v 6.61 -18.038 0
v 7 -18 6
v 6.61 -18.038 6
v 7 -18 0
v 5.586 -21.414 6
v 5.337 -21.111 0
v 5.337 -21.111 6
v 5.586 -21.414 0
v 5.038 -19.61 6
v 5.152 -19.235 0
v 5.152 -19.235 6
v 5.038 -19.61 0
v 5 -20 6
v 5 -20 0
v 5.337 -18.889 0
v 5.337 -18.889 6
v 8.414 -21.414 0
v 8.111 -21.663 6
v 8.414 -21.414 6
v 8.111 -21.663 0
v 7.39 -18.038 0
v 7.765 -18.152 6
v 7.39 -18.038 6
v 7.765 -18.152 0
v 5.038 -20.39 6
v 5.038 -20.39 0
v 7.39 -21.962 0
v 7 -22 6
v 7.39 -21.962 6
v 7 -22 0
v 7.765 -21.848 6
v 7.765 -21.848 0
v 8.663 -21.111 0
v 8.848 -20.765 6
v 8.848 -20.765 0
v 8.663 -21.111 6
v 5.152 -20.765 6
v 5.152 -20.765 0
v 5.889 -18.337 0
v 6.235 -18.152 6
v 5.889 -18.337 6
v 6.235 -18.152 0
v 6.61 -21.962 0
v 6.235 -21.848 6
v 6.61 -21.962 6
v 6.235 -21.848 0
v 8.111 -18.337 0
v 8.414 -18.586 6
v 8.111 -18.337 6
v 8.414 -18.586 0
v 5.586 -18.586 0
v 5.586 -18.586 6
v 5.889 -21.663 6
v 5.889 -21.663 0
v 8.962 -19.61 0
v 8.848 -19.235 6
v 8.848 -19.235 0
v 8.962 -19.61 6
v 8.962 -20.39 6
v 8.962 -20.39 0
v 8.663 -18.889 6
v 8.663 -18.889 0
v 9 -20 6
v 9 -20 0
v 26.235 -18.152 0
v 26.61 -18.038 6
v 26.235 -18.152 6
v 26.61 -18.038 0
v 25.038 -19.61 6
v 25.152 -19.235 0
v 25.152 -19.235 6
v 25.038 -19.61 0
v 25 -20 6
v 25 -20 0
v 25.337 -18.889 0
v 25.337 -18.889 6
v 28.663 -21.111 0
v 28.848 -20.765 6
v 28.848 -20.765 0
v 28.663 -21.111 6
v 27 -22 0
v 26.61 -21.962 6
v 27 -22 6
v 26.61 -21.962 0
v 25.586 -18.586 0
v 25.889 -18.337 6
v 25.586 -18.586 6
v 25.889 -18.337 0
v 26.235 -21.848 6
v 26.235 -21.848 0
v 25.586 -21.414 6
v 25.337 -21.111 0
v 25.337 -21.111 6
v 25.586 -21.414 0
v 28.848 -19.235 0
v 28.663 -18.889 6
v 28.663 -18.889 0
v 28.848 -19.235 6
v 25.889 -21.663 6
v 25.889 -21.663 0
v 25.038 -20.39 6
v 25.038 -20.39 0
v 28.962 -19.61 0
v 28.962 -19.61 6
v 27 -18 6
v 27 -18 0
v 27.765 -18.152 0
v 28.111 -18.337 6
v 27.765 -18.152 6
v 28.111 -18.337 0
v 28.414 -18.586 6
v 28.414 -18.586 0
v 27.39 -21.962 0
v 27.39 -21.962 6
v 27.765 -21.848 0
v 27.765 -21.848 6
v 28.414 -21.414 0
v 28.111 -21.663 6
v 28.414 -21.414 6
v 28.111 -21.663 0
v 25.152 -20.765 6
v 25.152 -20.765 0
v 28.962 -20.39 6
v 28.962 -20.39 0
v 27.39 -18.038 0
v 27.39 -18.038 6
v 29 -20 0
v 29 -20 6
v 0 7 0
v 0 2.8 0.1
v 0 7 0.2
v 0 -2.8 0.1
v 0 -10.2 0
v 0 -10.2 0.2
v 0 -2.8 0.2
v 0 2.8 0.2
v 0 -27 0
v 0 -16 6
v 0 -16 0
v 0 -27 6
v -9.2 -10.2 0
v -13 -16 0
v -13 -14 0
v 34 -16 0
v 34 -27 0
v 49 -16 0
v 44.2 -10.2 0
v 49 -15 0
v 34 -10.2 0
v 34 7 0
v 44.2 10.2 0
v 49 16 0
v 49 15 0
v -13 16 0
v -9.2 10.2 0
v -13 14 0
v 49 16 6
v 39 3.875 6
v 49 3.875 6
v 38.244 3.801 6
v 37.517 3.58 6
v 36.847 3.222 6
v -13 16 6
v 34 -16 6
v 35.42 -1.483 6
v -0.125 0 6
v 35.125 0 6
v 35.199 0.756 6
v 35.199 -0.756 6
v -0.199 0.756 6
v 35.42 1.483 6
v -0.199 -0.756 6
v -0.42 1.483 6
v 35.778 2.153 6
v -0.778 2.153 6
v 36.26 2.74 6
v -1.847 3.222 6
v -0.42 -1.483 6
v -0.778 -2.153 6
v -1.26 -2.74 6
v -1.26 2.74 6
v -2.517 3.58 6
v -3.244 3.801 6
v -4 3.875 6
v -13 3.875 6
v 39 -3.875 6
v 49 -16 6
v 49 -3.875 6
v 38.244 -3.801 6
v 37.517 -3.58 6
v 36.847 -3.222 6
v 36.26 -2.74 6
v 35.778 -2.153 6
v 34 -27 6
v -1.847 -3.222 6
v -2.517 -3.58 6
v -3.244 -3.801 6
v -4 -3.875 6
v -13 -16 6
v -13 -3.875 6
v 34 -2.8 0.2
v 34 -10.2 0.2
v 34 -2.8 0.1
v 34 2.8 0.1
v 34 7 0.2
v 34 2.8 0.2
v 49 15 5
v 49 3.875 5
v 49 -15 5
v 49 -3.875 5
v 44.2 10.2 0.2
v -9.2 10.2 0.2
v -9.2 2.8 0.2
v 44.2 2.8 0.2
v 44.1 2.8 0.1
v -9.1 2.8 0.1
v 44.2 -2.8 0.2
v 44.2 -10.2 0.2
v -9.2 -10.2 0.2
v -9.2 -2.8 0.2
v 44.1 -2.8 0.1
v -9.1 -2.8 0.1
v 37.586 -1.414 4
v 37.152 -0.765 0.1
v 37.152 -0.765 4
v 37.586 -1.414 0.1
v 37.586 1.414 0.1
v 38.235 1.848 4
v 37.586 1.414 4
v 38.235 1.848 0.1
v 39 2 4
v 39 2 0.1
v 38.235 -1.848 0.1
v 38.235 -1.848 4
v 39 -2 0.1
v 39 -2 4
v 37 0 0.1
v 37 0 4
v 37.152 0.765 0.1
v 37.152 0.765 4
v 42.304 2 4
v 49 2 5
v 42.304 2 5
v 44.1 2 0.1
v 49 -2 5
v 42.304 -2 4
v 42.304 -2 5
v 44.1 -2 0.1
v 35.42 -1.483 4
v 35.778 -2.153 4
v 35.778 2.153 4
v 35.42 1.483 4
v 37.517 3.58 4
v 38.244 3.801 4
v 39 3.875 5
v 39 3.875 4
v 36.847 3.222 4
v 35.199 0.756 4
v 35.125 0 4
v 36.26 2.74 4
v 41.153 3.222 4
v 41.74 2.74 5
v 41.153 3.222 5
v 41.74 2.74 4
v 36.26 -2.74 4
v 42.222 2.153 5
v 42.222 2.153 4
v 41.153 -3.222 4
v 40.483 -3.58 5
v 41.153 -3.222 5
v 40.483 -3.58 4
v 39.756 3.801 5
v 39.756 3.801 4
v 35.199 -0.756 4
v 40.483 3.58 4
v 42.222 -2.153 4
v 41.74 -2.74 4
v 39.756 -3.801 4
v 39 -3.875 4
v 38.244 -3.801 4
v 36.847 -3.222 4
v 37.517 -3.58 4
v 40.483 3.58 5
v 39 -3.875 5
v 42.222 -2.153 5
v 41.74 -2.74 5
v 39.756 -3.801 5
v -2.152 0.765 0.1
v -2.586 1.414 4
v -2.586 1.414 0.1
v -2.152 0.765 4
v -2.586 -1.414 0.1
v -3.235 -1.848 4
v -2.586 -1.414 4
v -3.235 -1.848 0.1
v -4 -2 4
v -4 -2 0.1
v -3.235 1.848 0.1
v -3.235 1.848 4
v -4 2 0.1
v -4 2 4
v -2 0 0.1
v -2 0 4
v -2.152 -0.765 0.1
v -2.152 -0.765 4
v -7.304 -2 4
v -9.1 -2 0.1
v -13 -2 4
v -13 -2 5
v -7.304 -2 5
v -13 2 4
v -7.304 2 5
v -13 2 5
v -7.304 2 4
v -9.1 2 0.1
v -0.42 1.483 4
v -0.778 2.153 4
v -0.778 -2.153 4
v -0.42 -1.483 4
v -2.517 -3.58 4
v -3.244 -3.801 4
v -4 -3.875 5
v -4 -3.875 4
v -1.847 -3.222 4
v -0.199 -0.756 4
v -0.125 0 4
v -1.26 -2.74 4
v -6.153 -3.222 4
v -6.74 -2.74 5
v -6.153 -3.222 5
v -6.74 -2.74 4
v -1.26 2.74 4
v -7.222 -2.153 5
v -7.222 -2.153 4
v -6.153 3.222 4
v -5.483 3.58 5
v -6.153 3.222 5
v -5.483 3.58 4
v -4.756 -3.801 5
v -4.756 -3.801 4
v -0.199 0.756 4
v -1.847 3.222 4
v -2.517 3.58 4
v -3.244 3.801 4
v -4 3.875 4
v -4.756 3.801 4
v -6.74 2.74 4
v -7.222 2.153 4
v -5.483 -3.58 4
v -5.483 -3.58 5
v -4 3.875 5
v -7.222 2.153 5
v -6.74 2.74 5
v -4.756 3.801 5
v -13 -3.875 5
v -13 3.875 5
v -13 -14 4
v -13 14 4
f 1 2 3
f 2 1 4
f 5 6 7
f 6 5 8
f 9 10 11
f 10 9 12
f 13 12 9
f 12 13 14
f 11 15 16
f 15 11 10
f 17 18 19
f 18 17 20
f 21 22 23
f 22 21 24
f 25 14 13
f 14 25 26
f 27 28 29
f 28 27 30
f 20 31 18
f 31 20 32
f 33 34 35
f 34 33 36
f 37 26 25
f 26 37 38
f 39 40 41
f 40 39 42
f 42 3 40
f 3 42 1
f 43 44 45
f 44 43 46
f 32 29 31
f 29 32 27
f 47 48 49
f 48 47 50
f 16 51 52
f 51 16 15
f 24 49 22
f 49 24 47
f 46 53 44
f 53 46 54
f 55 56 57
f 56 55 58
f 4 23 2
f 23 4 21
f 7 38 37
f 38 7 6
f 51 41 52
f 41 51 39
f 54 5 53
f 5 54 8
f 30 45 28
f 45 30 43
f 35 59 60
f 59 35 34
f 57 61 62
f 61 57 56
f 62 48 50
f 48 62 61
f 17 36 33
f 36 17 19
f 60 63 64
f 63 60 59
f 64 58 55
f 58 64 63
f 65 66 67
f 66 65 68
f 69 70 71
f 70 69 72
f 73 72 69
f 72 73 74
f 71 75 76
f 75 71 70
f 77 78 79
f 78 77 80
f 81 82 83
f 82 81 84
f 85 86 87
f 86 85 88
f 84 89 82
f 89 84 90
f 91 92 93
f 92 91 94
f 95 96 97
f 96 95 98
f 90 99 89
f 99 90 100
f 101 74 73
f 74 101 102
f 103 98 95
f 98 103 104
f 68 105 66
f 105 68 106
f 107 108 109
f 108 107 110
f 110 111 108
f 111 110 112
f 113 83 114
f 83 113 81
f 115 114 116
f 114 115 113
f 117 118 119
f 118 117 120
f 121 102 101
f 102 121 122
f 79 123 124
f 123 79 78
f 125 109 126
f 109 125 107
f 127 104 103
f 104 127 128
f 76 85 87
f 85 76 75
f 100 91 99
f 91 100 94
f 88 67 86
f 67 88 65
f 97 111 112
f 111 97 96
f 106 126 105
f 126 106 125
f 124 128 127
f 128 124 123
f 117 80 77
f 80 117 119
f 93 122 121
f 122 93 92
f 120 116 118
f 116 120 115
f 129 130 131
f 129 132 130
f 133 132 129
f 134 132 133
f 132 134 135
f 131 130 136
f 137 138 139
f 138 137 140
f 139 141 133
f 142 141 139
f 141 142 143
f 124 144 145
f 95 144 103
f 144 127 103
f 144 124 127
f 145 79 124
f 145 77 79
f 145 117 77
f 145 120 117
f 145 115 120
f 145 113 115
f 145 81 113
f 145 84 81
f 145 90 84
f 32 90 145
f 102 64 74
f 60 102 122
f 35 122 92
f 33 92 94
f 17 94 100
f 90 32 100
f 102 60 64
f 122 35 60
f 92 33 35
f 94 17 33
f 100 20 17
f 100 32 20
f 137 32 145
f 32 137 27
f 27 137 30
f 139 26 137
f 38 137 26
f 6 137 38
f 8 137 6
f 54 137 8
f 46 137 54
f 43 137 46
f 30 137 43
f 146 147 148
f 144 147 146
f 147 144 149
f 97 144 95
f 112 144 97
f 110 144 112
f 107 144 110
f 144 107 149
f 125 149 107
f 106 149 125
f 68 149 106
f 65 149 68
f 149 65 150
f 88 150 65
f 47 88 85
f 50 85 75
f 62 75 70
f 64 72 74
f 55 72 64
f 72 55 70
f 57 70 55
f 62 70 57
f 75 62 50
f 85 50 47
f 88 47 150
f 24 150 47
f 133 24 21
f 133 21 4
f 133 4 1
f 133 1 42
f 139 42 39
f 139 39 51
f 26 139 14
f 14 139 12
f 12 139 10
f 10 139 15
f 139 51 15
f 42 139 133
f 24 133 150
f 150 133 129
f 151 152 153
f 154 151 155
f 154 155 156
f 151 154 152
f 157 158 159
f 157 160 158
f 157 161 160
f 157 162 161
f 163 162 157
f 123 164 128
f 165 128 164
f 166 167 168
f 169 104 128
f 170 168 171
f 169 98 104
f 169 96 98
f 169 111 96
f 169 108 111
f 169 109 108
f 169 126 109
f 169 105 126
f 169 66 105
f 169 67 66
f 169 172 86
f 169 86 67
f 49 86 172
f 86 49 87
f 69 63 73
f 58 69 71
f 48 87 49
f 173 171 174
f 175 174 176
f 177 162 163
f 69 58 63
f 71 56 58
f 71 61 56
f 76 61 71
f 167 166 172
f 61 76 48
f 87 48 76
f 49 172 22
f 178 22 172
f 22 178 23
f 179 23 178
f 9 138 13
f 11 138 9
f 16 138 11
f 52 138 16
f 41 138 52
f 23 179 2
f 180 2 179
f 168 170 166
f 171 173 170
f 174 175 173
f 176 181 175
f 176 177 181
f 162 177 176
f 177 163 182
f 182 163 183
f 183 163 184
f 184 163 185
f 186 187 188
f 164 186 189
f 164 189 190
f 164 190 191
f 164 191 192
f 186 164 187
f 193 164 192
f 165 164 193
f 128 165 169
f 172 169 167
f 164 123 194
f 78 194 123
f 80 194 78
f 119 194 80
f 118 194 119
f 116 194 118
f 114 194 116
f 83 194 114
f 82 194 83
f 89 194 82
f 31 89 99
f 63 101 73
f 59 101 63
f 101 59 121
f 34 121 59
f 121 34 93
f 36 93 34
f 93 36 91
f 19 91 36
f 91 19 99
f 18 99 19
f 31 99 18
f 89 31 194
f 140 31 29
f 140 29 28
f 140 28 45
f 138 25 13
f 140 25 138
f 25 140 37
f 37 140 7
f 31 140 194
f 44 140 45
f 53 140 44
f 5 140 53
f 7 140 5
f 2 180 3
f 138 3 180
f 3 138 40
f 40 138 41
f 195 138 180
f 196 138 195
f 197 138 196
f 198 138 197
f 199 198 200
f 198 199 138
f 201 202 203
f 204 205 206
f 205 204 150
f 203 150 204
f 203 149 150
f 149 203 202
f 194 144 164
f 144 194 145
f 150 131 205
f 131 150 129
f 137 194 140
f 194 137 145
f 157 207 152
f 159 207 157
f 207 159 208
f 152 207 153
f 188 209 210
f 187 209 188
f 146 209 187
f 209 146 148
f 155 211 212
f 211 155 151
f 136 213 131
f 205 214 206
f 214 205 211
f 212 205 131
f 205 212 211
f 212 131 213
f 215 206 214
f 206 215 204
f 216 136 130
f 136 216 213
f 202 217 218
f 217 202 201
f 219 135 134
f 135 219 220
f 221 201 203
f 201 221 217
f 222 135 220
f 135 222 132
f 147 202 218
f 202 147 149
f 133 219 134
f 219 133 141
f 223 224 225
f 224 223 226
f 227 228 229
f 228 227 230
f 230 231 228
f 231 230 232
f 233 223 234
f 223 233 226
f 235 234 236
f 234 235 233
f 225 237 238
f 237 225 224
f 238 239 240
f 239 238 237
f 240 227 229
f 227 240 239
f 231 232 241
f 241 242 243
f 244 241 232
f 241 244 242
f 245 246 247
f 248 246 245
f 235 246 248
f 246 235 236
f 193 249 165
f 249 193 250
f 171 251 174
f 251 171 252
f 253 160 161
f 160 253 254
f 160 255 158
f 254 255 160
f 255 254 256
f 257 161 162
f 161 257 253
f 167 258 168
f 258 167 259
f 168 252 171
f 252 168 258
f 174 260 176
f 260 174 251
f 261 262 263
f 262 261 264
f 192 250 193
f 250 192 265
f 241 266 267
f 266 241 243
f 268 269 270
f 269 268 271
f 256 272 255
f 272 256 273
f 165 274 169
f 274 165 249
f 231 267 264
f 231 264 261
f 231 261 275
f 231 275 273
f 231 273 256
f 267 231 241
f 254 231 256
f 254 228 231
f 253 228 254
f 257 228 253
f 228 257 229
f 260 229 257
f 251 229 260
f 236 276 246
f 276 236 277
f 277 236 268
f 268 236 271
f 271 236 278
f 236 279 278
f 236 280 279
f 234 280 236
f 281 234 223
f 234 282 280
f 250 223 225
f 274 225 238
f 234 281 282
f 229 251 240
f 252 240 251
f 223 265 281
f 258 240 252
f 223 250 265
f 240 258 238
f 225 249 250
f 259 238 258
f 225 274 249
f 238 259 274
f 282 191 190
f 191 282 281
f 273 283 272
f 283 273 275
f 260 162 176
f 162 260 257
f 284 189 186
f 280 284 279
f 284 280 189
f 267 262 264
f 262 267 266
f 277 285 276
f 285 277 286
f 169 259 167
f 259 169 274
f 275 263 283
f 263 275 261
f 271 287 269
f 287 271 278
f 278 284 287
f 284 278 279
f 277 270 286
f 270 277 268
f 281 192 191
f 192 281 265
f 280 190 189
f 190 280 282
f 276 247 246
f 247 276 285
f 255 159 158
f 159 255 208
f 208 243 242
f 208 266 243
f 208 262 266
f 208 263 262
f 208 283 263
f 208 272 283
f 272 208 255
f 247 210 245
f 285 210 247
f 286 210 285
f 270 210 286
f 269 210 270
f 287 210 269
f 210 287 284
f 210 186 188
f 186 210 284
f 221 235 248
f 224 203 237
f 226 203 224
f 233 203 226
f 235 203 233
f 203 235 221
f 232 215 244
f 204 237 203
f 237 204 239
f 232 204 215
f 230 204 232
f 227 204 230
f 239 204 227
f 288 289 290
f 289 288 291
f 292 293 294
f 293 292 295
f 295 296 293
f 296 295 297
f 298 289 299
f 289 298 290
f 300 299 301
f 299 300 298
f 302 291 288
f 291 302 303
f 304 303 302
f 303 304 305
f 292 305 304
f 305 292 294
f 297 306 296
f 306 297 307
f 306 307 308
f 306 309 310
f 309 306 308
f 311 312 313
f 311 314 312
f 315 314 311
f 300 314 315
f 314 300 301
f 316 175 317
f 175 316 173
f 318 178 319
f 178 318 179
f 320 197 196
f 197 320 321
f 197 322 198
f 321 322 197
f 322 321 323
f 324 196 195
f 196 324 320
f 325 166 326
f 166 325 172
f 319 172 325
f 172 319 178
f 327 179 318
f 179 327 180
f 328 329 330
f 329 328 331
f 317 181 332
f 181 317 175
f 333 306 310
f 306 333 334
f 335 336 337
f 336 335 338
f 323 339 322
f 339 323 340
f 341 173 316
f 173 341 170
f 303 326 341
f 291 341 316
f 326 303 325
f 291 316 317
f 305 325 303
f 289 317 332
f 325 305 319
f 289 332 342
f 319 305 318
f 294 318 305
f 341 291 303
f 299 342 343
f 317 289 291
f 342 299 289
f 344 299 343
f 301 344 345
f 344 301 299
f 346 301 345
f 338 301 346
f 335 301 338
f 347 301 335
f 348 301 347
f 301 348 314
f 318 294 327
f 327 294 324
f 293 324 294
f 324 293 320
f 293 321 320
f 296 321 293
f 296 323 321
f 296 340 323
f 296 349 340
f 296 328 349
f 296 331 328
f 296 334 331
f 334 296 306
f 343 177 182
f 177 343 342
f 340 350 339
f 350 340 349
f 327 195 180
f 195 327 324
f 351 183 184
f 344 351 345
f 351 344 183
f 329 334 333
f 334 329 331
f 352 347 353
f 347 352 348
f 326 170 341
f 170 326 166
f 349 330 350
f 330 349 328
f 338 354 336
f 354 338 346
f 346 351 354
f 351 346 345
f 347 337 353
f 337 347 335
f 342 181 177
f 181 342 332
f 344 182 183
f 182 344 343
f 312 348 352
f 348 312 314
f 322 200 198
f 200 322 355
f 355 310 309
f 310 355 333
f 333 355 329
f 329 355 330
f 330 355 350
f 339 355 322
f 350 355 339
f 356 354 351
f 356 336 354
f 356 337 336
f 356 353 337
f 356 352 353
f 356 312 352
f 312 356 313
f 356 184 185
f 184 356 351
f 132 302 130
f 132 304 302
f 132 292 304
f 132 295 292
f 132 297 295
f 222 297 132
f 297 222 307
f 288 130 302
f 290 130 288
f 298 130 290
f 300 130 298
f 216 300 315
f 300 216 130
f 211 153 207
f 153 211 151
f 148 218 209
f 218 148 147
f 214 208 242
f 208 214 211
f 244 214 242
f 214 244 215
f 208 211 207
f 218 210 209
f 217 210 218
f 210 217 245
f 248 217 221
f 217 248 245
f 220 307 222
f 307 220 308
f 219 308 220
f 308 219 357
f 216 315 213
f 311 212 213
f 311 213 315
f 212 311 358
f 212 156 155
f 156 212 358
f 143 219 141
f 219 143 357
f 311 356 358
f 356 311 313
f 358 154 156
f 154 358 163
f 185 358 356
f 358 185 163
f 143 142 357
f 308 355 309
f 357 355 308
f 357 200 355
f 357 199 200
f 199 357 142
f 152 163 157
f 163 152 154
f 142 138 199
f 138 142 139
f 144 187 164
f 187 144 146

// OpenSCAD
// Generated by SolidPython 1.1.3 on 2024-01-25 11:21:24


difference() {
	translate(v = [0, 0, 5]) {
		rotate(a = 90, v = [0, 1, 0]) {
			union() {
				translate(v = [2, -10, 17]) {
					rotate(a = 90, v = [0, 1, 0]) {
						difference() {
							cube(center = true, size = [34, 34, 6]);
							union() {
								translate(v = [10, -10, 0]) {
									cylinder($fn = 32, center = true, h = 20, r = 2.0000000000);
								}
								translate(v = [-10, -10, 0]) {
									cylinder($fn = 32, center = true, h = 20, r = 2.0000000000);
								}
							}
						}
					}
				}
				translate(v = [0, 0, -12]) {
					translate(v = [15, 0, 30]) {
						rotate(a = 90, v = [0, 1, 0]) {
							difference() {
								union() {
									union();
									translate(v = [-31, 0, 0]) {
										rotate(a = [0, 90.0, 0.0]) {
											translate(v = [0, 0, 31.0]) {
												cube(center = true, size = [32.0000000000, 32.0000000000, 62.0]);
											}
										}
									}
									union();
								}
								union() {
									union();
									translate(v = [-31, 0, 0]) {
										rotate(a = [0, 90.0, 0.0]) {
											translate(v = [0, 0, 10]) {
												rotate(a = -90, v = [0, -1, 0]) {
													rotate(a = 90, v = [0, 0, 1]) {
														union() {
															union();
															translate(v = [0, -10, 0]) {
																rotate(a = -90, v = [1, 0, 0]) {
																	polyhedron(convexity = 10, faces = [[0, 1, 4], [1, 5, 4], [1, 2, 5], [2, 6, 5], [2, 3, 6], [3, 7, 6], [3, 0, 7], [0, 4, 7], [3, 2, 1, 0], [4, 5, 6, 7]], points = [[-15.0000000000, 15.0000000000, 0.0000000000], [15.0000000000, 15.0000000000, 0.0000000000], [15.0000000000, -15.0000000000, 0.0000000000], [-15.0000000000, -15.0000000000, 0.0000000000], [0.0000000000, 0.0000000000, 15.0000000000], [0.0000000000, 0.0000000000, 15.0000000000], [0.0000000000, 0.0000000000, 15.0000000000], [0.0000000000, 0.0000000000, 15.0000000000]]);
																}
															}
															translate(v = [0, 43.0, 0]) {
																rotate(a = 180, v = [1, 0, 0]) {
																	translate(v = [0, -10, 0]) {
																		rotate(a = -90, v = [1, 0, 0]) {
																			polyhedron(convexity = 10, faces = [[0, 1, 4], [1, 5, 4], [1, 2, 5], [2, 6, 5], [2, 3, 6], [3, 7, 6], [3, 0, 7], [0, 4, 7], [3, 2, 1, 0], [4, 5, 6, 7]], points = [[-15.0000000000, 15.0000000000, 0.0000000000], [15.0000000000, 15.0000000000, 0.0000000000], [15.0000000000, -15.0000000000, 0.0000000000], [-15.0000000000, -15.0000000000, 0.0000000000], [0.0000000000, 0.0000000000, 15.0000000000], [0.0000000000, 0.0000000000, 15.0000000000], [0.0000000000, 0.0000000000, 15.0000000000], [0.0000000000, 0.0000000000, 15.0000000000]]);
																		}
																	}
																}
															}
															translate(v = [0, -10, 0]) {
																rotate(a = -90, v = [1, 0, 0]) {
																	union() {
																		polyhedron(convexity = 10, faces = [[0, 1, 5], [1, 6, 5], [1, 2, 6], [2, 7, 6], [2, 3, 7], [3, 8, 7], [3, 4, 8], [4, 9, 8], [4, 0, 9], [0, 5, 9], [4, 3, 2, 1, 0], [5, 6, 7, 8, 9]], points = [[-10.2, 10.2, 0.0], [-10.2, 2.8, 0.0], [-4.3999999999999995, 2.8, 0.0], [-4.3999999999999995, 0.0, 0.0], [0.0, 0.0, 0.0], [-10.2, 10.2, 62.0], [-10.2, 2.8, 62.0], [-4.3999999999999995, 2.8, 62.0], [-4.3999999999999995, 0.0, 62.0], [0.0, 0.0, 62.0]]);
																		mirror(v = [0, 1]) {
																			polyhedron(convexity = 10, faces = [[0, 1, 5], [1, 6, 5], [1, 2, 6], [2, 7, 6], [2, 3, 7], [3, 8, 7], [3, 4, 8], [4, 9, 8], [4, 0, 9], [0, 5, 9], [4, 3, 2, 1, 0], [5, 6, 7, 8, 9]], points = [[-10.2, 10.2, 0.0], [-10.2, 2.8, 0.0], [-4.3999999999999995, 2.8, 0.0], [-4.3999999999999995, 0.0, 0.0], [0.0, 0.0, 0.0], [-10.2, 10.2, 62.0], [-10.2, 2.8, 62.0], [-4.3999999999999995, 2.8, 62.0], [-4.3999999999999995, 0.0, 62.0], [0.0, 0.0, 62.0]]);
																		}
																		mirror(v = [1, 1]) {
																			union() {
																				polyhedron(convexity = 10, faces = [[0, 1, 5], [1, 6, 5], [1, 2, 6], [2, 7, 6], [2, 3, 7], [3, 8, 7], [3, 4, 8], [4, 9, 8], [4, 0, 9], [0, 5, 9], [4, 3, 2, 1, 0], [5, 6, 7, 8, 9]], points = [[-10.2, 10.2, 0.0], [-10.2, 2.8, 0.0], [-4.3999999999999995, 2.8, 0.0], [-4.3999999999999995, 0.0, 0.0], [0.0, 0.0, 0.0], [-10.2, 10.2, 62.0], [-10.2, 2.8, 62.0], [-4.3999999999999995, 2.8, 62.0], [-4.3999999999999995, 0.0, 62.0], [0.0, 0.0, 62.0]]);
																				mirror(v = [0, 1]) {
																					polyhedron(convexity = 10, faces = [[0, 1, 5], [1, 6, 5], [1, 2, 6], [2, 7, 6], [2, 3, 7], [3, 8, 7], [3, 4, 8], [4, 9, 8], [4, 0, 9], [0, 5, 9], [4, 3, 2, 1, 0], [5, 6, 7, 8, 9]], points = [[-10.2, 10.2, 0.0], [-10.2, 2.8, 0.0], [-4.3999999999999995, 2.8, 0.0], [-4.3999999999999995, 0.0, 0.0], [0.0, 0.0, 0.0], [-10.2, 10.2, 62.0], [-10.2, 2.8, 62.0], [-4.3999999999999995, 2.8, 62.0], [-4.3999999999999995, 0.0, 62.0], [0.0, 0.0, 62.0]]);
																				}
																			}
																		}
																		mirror(v = [1, -1]) {
																			union() {
																				polyhedron(convexity = 10, faces = [[0, 1, 5], [1, 6, 5], [1, 2, 6], [2, 7, 6], [2, 3, 7], [3, 8, 7], [3, 4, 8], [4, 9, 8], [4, 0, 9], [0, 5, 9], [4, 3, 2, 1, 0], [5, 6, 7, 8, 9]], points = [[-10.2, 10.2, 0.0], [-10.2, 2.8, 0.0], [-4.3999999999999995, 2.8, 0.0], [-4.3999999999999995, 0.0, 0.0], [0.0, 0.0, 0.0], [-10.2, 10.2, 62.0], [-10.2, 2.8, 62.0], [-4.3999999999999995, 2.8, 62.0], [-4.3999999999999995, 0.0, 62.0], [0.0, 0.0, 62.0]]);
																				mirror(v = [0, 1]) {
																					polyhedron(convexity = 10, faces = [[0, 1, 5], [1, 6, 5], [1, 2, 6], [2, 7, 6], [2, 3, 7], [3, 8, 7], [3, 4, 8], [4, 9, 8], [4, 0, 9], [0, 5, 9], [4, 3, 2, 1, 0], [5, 6, 7, 8, 9]], points = [[-10.2, 10.2, 0.0], [-10.2, 2.8, 0.0], [-4.3999999999999995, 2.8, 0.0], [-4.3999999999999995, 0.0, 0.0], [0.0, 0.0, 0.0], [-10.2, 10.2, 62.0], [-10.2, 2.8, 62.0], [-4.3999999999999995, 2.8, 62.0], [-4.3999999999999995, 0.0, 62.0], [0.0, 0.0, 62.0]]);
																				}
																				mirror(v = [1, 1]) {
																					union() {
																						polyhedron(convexity = 10, faces = [[0, 1, 5], [1, 6, 5], [1, 2, 6], [2, 7, 6], [2, 3, 7], [3, 8, 7], [3, 4, 8], [4, 9, 8], [4, 0, 9], [0, 5, 9], [4, 3, 2, 1, 0], [5, 6, 7, 8, 9]], points = [[-10.2, 10.2, 0.0], [-10.2, 2.8, 0.0], [-4.3999999999999995, 2.8, 0.0], [-4.3999999999999995, 0.0, 0.0], [0.0, 0.0, 0.0], [-10.2, 10.2, 62.0], [-10.2, 2.8, 62.0], [-4.3999999999999995, 2.8, 62.0], [-4.3999999999999995, 0.0, 62.0], [0.0, 0.0, 62.0]]);
																						mirror(v = [0, 1]) {
																							polyhedron(convexity = 10, faces = [[0, 1, 5], [1, 6, 5], [1, 2, 6], [2, 7, 6], [2, 3, 7], [3, 8, 7], [3, 4, 8], [4, 9, 8], [4, 0, 9], [0, 5, 9], [4, 3, 2, 1, 0], [5, 6, 7, 8, 9]], points = [[-10.2, 10.2, 0.0], [-10.2, 2.8, 0.0], [-4.3999999999999995, 2.8, 0.0], [-4.3999999999999995, 0.0, 0.0], [0.0, 0.0, 0.0], [-10.2, 10.2, 62.0], [-10.2, 2.8, 62.0], [-4.3999999999999995, 2.8, 62.0], [-4.3999999999999995, 0.0, 62.0], [0.0, 0.0, 62.0]]);
																						}
																					}
																				}
																			}
																		}
																	}
																}
															}
															union() {
																union();
																rotate(a = 180, v = [0, 1, 0]) {
																	union() {
																		translate(v = [0, 0, 14]) {
																			cylinder($fn = 32, h = 4, r = 3.8750000000);
																		}
																		translate(v = [-3.8750000000, -12, 15]) {
																			cube(size = [7.7500000000, 12, 4]);
																		}
																		union() {
																			cylinder($fn = 16, h = 19, r = 2.0000000000);
																			translate(v = [-2.0000000000, -12, 0]) {
																				cube(size = [4, 12, 19]);
																			}
																		}
																		rotate(a = -90, v = [0, 1, 0]) {
																			polyhedron(convexity = 10, faces = [[0, 1, 3], [1, 4, 3], [1, 2, 4], [2, 5, 4], [2, 0, 5], [0, 3, 5], [2, 1, 0], [3, 4, 5]], points = [[0.0000000000, -10.0000000000, 0.0000000000], [10.1000000000, -10.0000000000, 10.1000000000], [10.1000000000, -10.0000000000, -10.1000000000], [0.0000000000, 12.0000000000, 0.0000000000], [10.1000000000, 12.0000000000, 10.1000000000], [10.1000000000, 12.0000000000, -10.1000000000]]);
																		}
																	}
																}
																rotate(a = 90, v = [0, 1, 0]) {
																	union() {
																		translate(v = [0, 0, 14]) {
																			cylinder($fn = 32, h = 4, r = 3.8750000000);
																		}
																		translate(v = [-3.8750000000, -12, 15]) {
																			cube(size = [7.7500000000, 12, 4]);
																		}
																		union() {
																			cylinder($fn = 16, h = 19, r = 2.0000000000);
																			translate(v = [-2.0000000000, -12, 0]) {
																				cube(size = [4, 12, 19]);
																			}
																		}
																		rotate(a = -90, v = [0, 1, 0]) {
																			polyhedron(convexity = 10, faces = [[0, 1, 3], [1, 4, 3], [1, 2, 4], [2, 5, 4], [2, 0, 5], [0, 3, 5], [2, 1, 0], [3, 4, 5]], points = [[0.0000000000, -10.0000000000, 0.0000000000], [10.1000000000, -10.0000000000, 10.1000000000], [10.1000000000, -10.0000000000, -10.1000000000], [0.0000000000, 12.0000000000, 0.0000000000], [10.1000000000, 12.0000000000, 10.1000000000], [10.1000000000, 12.0000000000, -10.1000000000]]);
																		}
																	}
																}
																union() {
																	translate(v = [0, 0, 14]) {
																		cylinder($fn = 32, h = 4, r = 3.8750000000);
																	}
																	translate(v = [-3.8750000000, -12, 15]) {
																		cube(size = [7.7500000000, 12, 4]);
																	}
																	union() {
																		cylinder($fn = 16, h = 19, r = 2.0000000000);
																		translate(v = [-2.0000000000, -12, 0]) {
																			cube(size = [4, 12, 19]);
																		}
																	}
																	rotate(a = -90, v = [0, 1, 0]) {
																		polyhedron(convexity = 10, faces = [[0, 1, 3], [1, 4, 3], [1, 2, 4], [2, 5, 4], [2, 0, 5], [0, 3, 5], [2, 1, 0], [3, 4, 5]], points = [[0.0000000000, -10.0000000000, 0.0000000000], [10.1000000000, -10.0000000000, 10.1000000000], [10.1000000000, -10.0000000000, -10.1000000000], [0.0000000000, 12.0000000000, 0.0000000000], [10.1000000000, 12.0000000000, 10.1000000000], [10.1000000000, 12.0000000000, -10.1000000000]]);
																	}
																}
																rotate(a = 270, v = [0, 1, 0]) {
																	union() {
																		translate(v = [0, 0, 14]) {
																			cylinder($fn = 32, h = 4, r = 3.8750000000);
																		}
																		translate(v = [-3.8750000000, -12, 15]) {
																			cube(size = [7.7500000000, 12, 4]);
																		}
																		union() {
																			cylinder($fn = 16, h = 19, r = 2.0000000000);
																			translate(v = [-2.0000000000, -12, 0]) {
																				cube(size = [4, 12, 19]);
																			}
																		}
																		rotate(a = -90, v = [0, 1, 0]) {
																			polyhedron(convexity = 10, faces = [[0, 1, 3], [1, 4, 3], [1, 2, 4], [2, 5, 4], [2, 0, 5], [0, 3, 5], [2, 1, 0], [3, 4, 5]], points = [[0.0000000000, -10.0000000000, 0.0000000000], [10.1000000000, -10.0000000000, 10.1000000000], [10.1000000000, -10.0000000000, -10.1000000000], [0.0000000000, 12.0000000000, 0.0000000000], [10.1000000000, 12.0000000000, 10.1000000000], [10.1000000000, 12.0000000000, -10.1000000000]]);
																		}
																	}
																}
																translate(v = [0, 43.0, 0]) {
																	rotate(a = 180, v = [1, 0, 0]) {
																		rotate(a = 180, v = [0, 1, 0]) {
																			union() {
																				translate(v = [0, 0, 14]) {
																					cylinder($fn = 32, h = 4, r = 3.8750000000);
																				}
																				translate(v = [-3.8750000000, -12, 15]) {
																					cube(size = [7.7500000000, 12, 4]);
																				}
																				union() {
																					cylinder($fn = 16, h = 19, r = 2.0000000000);
																					translate(v = [-2.0000000000, -12, 0]) {
																						cube(size = [4, 12, 19]);
																					}
																				}
																				rotate(a = -90, v = [0, 1, 0]) {
																					polyhedron(convexity = 10, faces = [[0, 1, 3], [1, 4, 3], [1, 2, 4], [2, 5, 4], [2, 0, 5], [0, 3, 5], [2, 1, 0], [3, 4, 5]], points = [[0.0000000000, -10.0000000000, 0.0000000000], [10.1000000000, -10.0000000000, 10.1000000000], [10.1000000000, -10.0000000000, -10.1000000000], [0.0000000000, 12.0000000000, 0.0000000000], [10.1000000000, 12.0000000000, 10.1000000000], [10.1000000000, 12.0000000000, -10.1000000000]]);
																				}
																			}
																		}
																	}
																}
																translate(v = [0, 43.0, 0]) {
																	rotate(a = 180, v = [1, 0, 0]) {
																		rotate(a = 90, v = [0, 1, 0]) {
																			union() {
																				translate(v = [0, 0, 14]) {
																					cylinder($fn = 32, h = 4, r = 3.8750000000);
																				}
																				translate(v = [-3.8750000000, -12, 15]) {
																					cube(size = [7.7500000000, 12, 4]);
																				}
																				union() {
																					cylinder($fn = 16, h = 19, r = 2.0000000000);
																					translate(v = [-2.0000000000, -12, 0]) {
																						cube(size = [4, 12, 19]);
																					}
																				}
																				rotate(a = -90, v = [0, 1, 0]) {
																					polyhedron(convexity = 10, faces = [[0, 1, 3], [1, 4, 3], [1, 2, 4], [2, 5, 4], [2, 0, 5], [0, 3, 5], [2, 1, 0], [3, 4, 5]], points = [[0.0000000000, -10.0000000000, 0.0000000000], [10.1000000000, -10.0000000000, 10.1000000000], [10.1000000000, -10.0000000000, -10.1000000000], [0.0000000000, 12.0000000000, 0.0000000000], [10.1000000000, 12.0000000000, 10.1000000000], [10.1000000000, 12.0000000000, -10.1000000000]]);
																				}
																			}
																		}
																	}
																}
																translate(v = [0, 43.0, 0]) {
																	rotate(a = 180, v = [1, 0, 0]) {
																		union() {
																			translate(v = [0, 0, 14]) {
																				cylinder($fn = 32, h = 4, r = 3.8750000000);
																			}
																			translate(v = [-3.8750000000, -12, 15]) {
																				cube(size = [7.7500000000, 12, 4]);
																			}
																			union() {
																				cylinder($fn = 16, h = 19, r = 2.0000000000);
																				translate(v = [-2.0000000000, -12, 0]) {
																					cube(size = [4, 12, 19]);
																				}
																			}
																			rotate(a = -90, v = [0, 1, 0]) {
																				polyhedron(convexity = 10, faces = [[0, 1, 3], [1, 4, 3], [1, 2, 4], [2, 5, 4], [2, 0, 5], [0, 3, 5], [2, 1, 0], [3, 4, 5]], points = [[0.0000000000, -10.0000000000, 0.0000000000], [10.1000000000, -10.0000000000, 10.1000000000], [10.1000000000, -10.0000000000, -10.1000000000], [0.0000000000, 12.0000000000, 0.0000000000], [10.1000000000, 12.0000000000, 10.1000000000], [10.1000000000, 12.0000000000, -10.1000000000]]);
																			}
																		}
																	}
																}
																translate(v = [0, 43.0, 0]) {
																	rotate(a = 180, v = [1, 0, 0]) {
																		rotate(a = 270, v = [0, 1, 0]) {
																			union() {
																				translate(v = [0, 0, 14]) {
																					cylinder($fn = 32, h = 4, r = 3.8750000000);
																				}
																				translate(v = [-3.8750000000, -12, 15]) {
																					cube(size = [7.7500000000, 12, 4]);
																				}
																				union() {
																					cylinder($fn = 16, h = 19, r = 2.0000000000);
																					translate(v = [-2.0000000000, -12, 0]) {
																						cube(size = [4, 12, 19]);
																					}
																				}
																				rotate(a = -90, v = [0, 1, 0]) {
																					polyhedron(convexity = 10, faces = [[0, 1, 3], [1, 4, 3], [1, 2, 4], [2, 5, 4], [2, 0, 5], [0, 3, 5], [2, 1, 0], [3, 4, 5]], points = [[0.0000000000, -10.0000000000, 0.0000000000], [10.1000000000, -10.0000000000, 10.1000000000], [10.1000000000, -10.0000000000, -10.1000000000], [0.0000000000, 12.0000000000, 0.0000000000], [10.1000000000, 12.0000000000, 10.1000000000], [10.1000000000, 12.0000000000, -10.1000000000]]);
																				}
																			}
																		}
																	}
																}
															}
														}
													}
												}
											}
										}
									}
								}
							}
						}
					}
				}
			}
		}
	}
	translate(v = [0, 0, -150]) {
		cube(center = true, size = [300, 300, 300]);
	}
}
/***********************************************
*********      SolidPython code:      **********
************************************************
 
#! /usr/bin/env python3
import sys
from math import cos, radians, sin, pi, tau
from pathlib import Path

from solid import *
from solid.utils import *

from typing import Set, Sequence, List, Callable, Optional, Union, Iterable, Tuple

import numpy as np

import extrusion_fittings as ef

class EndStopMount():
	def __init__(self,endstop_size = 34,screw_dia = 4, mount_thick = 6):
		self.endstop_size = endstop_size
		self.screw_dia = screw_dia
		self.mount_thick = mount_thick

	def screws(self) -> OpenSCADObject:
		screw = cylinder(r=self.screw_dia/2, h=20, segments = 32, center=True)
		screws = translate([10,-10,0])(screw)
		screws += translate([-10,-10,0])(screw)
		return screws

	def endstop_mount(self) -> OpenSCADObject:
		mm = cube([self.endstop_size,self.endstop_size,self.mount_thick], center=True)
		mm -= self.screws()
		mm = rotate(a = 90,v = (0,1,0))(mm)
		mm = translate([2,-10,17])(mm)
		return mm

	def bisect_floor(self,input) -> OpenSCADObject:
		size = 300
		floor = translate([0,0,-150])(cube([300,300,300],center = True))
		return input - floor


if __name__ == "__main__":
	out_dir = sys.argv[1] if len(sys.argv) > 1 else Path(__file__).parent

	e = ef.Fittings(31)
	m = EndStopMount()
	a = m.endstop_mount()
	t = e.tube()
	t = rotate(a = 90,v = (0,1,0))(t)
	t = translate([15,0,30])(t)
	t = translate([0,0,-12])(t)
	a += t
	a = rotate(a = 90, v = (0,1,0))(a)
	a = translate([0,0,5])(a)
	a = m.bisect_floor(a)

	file_out = scad_render_to_file(a,  out_dir=out_dir, include_orig_code=True)
	print(f"{__file__}: SCAD file written to: \n{file_out}")
 
 
************************************************/
